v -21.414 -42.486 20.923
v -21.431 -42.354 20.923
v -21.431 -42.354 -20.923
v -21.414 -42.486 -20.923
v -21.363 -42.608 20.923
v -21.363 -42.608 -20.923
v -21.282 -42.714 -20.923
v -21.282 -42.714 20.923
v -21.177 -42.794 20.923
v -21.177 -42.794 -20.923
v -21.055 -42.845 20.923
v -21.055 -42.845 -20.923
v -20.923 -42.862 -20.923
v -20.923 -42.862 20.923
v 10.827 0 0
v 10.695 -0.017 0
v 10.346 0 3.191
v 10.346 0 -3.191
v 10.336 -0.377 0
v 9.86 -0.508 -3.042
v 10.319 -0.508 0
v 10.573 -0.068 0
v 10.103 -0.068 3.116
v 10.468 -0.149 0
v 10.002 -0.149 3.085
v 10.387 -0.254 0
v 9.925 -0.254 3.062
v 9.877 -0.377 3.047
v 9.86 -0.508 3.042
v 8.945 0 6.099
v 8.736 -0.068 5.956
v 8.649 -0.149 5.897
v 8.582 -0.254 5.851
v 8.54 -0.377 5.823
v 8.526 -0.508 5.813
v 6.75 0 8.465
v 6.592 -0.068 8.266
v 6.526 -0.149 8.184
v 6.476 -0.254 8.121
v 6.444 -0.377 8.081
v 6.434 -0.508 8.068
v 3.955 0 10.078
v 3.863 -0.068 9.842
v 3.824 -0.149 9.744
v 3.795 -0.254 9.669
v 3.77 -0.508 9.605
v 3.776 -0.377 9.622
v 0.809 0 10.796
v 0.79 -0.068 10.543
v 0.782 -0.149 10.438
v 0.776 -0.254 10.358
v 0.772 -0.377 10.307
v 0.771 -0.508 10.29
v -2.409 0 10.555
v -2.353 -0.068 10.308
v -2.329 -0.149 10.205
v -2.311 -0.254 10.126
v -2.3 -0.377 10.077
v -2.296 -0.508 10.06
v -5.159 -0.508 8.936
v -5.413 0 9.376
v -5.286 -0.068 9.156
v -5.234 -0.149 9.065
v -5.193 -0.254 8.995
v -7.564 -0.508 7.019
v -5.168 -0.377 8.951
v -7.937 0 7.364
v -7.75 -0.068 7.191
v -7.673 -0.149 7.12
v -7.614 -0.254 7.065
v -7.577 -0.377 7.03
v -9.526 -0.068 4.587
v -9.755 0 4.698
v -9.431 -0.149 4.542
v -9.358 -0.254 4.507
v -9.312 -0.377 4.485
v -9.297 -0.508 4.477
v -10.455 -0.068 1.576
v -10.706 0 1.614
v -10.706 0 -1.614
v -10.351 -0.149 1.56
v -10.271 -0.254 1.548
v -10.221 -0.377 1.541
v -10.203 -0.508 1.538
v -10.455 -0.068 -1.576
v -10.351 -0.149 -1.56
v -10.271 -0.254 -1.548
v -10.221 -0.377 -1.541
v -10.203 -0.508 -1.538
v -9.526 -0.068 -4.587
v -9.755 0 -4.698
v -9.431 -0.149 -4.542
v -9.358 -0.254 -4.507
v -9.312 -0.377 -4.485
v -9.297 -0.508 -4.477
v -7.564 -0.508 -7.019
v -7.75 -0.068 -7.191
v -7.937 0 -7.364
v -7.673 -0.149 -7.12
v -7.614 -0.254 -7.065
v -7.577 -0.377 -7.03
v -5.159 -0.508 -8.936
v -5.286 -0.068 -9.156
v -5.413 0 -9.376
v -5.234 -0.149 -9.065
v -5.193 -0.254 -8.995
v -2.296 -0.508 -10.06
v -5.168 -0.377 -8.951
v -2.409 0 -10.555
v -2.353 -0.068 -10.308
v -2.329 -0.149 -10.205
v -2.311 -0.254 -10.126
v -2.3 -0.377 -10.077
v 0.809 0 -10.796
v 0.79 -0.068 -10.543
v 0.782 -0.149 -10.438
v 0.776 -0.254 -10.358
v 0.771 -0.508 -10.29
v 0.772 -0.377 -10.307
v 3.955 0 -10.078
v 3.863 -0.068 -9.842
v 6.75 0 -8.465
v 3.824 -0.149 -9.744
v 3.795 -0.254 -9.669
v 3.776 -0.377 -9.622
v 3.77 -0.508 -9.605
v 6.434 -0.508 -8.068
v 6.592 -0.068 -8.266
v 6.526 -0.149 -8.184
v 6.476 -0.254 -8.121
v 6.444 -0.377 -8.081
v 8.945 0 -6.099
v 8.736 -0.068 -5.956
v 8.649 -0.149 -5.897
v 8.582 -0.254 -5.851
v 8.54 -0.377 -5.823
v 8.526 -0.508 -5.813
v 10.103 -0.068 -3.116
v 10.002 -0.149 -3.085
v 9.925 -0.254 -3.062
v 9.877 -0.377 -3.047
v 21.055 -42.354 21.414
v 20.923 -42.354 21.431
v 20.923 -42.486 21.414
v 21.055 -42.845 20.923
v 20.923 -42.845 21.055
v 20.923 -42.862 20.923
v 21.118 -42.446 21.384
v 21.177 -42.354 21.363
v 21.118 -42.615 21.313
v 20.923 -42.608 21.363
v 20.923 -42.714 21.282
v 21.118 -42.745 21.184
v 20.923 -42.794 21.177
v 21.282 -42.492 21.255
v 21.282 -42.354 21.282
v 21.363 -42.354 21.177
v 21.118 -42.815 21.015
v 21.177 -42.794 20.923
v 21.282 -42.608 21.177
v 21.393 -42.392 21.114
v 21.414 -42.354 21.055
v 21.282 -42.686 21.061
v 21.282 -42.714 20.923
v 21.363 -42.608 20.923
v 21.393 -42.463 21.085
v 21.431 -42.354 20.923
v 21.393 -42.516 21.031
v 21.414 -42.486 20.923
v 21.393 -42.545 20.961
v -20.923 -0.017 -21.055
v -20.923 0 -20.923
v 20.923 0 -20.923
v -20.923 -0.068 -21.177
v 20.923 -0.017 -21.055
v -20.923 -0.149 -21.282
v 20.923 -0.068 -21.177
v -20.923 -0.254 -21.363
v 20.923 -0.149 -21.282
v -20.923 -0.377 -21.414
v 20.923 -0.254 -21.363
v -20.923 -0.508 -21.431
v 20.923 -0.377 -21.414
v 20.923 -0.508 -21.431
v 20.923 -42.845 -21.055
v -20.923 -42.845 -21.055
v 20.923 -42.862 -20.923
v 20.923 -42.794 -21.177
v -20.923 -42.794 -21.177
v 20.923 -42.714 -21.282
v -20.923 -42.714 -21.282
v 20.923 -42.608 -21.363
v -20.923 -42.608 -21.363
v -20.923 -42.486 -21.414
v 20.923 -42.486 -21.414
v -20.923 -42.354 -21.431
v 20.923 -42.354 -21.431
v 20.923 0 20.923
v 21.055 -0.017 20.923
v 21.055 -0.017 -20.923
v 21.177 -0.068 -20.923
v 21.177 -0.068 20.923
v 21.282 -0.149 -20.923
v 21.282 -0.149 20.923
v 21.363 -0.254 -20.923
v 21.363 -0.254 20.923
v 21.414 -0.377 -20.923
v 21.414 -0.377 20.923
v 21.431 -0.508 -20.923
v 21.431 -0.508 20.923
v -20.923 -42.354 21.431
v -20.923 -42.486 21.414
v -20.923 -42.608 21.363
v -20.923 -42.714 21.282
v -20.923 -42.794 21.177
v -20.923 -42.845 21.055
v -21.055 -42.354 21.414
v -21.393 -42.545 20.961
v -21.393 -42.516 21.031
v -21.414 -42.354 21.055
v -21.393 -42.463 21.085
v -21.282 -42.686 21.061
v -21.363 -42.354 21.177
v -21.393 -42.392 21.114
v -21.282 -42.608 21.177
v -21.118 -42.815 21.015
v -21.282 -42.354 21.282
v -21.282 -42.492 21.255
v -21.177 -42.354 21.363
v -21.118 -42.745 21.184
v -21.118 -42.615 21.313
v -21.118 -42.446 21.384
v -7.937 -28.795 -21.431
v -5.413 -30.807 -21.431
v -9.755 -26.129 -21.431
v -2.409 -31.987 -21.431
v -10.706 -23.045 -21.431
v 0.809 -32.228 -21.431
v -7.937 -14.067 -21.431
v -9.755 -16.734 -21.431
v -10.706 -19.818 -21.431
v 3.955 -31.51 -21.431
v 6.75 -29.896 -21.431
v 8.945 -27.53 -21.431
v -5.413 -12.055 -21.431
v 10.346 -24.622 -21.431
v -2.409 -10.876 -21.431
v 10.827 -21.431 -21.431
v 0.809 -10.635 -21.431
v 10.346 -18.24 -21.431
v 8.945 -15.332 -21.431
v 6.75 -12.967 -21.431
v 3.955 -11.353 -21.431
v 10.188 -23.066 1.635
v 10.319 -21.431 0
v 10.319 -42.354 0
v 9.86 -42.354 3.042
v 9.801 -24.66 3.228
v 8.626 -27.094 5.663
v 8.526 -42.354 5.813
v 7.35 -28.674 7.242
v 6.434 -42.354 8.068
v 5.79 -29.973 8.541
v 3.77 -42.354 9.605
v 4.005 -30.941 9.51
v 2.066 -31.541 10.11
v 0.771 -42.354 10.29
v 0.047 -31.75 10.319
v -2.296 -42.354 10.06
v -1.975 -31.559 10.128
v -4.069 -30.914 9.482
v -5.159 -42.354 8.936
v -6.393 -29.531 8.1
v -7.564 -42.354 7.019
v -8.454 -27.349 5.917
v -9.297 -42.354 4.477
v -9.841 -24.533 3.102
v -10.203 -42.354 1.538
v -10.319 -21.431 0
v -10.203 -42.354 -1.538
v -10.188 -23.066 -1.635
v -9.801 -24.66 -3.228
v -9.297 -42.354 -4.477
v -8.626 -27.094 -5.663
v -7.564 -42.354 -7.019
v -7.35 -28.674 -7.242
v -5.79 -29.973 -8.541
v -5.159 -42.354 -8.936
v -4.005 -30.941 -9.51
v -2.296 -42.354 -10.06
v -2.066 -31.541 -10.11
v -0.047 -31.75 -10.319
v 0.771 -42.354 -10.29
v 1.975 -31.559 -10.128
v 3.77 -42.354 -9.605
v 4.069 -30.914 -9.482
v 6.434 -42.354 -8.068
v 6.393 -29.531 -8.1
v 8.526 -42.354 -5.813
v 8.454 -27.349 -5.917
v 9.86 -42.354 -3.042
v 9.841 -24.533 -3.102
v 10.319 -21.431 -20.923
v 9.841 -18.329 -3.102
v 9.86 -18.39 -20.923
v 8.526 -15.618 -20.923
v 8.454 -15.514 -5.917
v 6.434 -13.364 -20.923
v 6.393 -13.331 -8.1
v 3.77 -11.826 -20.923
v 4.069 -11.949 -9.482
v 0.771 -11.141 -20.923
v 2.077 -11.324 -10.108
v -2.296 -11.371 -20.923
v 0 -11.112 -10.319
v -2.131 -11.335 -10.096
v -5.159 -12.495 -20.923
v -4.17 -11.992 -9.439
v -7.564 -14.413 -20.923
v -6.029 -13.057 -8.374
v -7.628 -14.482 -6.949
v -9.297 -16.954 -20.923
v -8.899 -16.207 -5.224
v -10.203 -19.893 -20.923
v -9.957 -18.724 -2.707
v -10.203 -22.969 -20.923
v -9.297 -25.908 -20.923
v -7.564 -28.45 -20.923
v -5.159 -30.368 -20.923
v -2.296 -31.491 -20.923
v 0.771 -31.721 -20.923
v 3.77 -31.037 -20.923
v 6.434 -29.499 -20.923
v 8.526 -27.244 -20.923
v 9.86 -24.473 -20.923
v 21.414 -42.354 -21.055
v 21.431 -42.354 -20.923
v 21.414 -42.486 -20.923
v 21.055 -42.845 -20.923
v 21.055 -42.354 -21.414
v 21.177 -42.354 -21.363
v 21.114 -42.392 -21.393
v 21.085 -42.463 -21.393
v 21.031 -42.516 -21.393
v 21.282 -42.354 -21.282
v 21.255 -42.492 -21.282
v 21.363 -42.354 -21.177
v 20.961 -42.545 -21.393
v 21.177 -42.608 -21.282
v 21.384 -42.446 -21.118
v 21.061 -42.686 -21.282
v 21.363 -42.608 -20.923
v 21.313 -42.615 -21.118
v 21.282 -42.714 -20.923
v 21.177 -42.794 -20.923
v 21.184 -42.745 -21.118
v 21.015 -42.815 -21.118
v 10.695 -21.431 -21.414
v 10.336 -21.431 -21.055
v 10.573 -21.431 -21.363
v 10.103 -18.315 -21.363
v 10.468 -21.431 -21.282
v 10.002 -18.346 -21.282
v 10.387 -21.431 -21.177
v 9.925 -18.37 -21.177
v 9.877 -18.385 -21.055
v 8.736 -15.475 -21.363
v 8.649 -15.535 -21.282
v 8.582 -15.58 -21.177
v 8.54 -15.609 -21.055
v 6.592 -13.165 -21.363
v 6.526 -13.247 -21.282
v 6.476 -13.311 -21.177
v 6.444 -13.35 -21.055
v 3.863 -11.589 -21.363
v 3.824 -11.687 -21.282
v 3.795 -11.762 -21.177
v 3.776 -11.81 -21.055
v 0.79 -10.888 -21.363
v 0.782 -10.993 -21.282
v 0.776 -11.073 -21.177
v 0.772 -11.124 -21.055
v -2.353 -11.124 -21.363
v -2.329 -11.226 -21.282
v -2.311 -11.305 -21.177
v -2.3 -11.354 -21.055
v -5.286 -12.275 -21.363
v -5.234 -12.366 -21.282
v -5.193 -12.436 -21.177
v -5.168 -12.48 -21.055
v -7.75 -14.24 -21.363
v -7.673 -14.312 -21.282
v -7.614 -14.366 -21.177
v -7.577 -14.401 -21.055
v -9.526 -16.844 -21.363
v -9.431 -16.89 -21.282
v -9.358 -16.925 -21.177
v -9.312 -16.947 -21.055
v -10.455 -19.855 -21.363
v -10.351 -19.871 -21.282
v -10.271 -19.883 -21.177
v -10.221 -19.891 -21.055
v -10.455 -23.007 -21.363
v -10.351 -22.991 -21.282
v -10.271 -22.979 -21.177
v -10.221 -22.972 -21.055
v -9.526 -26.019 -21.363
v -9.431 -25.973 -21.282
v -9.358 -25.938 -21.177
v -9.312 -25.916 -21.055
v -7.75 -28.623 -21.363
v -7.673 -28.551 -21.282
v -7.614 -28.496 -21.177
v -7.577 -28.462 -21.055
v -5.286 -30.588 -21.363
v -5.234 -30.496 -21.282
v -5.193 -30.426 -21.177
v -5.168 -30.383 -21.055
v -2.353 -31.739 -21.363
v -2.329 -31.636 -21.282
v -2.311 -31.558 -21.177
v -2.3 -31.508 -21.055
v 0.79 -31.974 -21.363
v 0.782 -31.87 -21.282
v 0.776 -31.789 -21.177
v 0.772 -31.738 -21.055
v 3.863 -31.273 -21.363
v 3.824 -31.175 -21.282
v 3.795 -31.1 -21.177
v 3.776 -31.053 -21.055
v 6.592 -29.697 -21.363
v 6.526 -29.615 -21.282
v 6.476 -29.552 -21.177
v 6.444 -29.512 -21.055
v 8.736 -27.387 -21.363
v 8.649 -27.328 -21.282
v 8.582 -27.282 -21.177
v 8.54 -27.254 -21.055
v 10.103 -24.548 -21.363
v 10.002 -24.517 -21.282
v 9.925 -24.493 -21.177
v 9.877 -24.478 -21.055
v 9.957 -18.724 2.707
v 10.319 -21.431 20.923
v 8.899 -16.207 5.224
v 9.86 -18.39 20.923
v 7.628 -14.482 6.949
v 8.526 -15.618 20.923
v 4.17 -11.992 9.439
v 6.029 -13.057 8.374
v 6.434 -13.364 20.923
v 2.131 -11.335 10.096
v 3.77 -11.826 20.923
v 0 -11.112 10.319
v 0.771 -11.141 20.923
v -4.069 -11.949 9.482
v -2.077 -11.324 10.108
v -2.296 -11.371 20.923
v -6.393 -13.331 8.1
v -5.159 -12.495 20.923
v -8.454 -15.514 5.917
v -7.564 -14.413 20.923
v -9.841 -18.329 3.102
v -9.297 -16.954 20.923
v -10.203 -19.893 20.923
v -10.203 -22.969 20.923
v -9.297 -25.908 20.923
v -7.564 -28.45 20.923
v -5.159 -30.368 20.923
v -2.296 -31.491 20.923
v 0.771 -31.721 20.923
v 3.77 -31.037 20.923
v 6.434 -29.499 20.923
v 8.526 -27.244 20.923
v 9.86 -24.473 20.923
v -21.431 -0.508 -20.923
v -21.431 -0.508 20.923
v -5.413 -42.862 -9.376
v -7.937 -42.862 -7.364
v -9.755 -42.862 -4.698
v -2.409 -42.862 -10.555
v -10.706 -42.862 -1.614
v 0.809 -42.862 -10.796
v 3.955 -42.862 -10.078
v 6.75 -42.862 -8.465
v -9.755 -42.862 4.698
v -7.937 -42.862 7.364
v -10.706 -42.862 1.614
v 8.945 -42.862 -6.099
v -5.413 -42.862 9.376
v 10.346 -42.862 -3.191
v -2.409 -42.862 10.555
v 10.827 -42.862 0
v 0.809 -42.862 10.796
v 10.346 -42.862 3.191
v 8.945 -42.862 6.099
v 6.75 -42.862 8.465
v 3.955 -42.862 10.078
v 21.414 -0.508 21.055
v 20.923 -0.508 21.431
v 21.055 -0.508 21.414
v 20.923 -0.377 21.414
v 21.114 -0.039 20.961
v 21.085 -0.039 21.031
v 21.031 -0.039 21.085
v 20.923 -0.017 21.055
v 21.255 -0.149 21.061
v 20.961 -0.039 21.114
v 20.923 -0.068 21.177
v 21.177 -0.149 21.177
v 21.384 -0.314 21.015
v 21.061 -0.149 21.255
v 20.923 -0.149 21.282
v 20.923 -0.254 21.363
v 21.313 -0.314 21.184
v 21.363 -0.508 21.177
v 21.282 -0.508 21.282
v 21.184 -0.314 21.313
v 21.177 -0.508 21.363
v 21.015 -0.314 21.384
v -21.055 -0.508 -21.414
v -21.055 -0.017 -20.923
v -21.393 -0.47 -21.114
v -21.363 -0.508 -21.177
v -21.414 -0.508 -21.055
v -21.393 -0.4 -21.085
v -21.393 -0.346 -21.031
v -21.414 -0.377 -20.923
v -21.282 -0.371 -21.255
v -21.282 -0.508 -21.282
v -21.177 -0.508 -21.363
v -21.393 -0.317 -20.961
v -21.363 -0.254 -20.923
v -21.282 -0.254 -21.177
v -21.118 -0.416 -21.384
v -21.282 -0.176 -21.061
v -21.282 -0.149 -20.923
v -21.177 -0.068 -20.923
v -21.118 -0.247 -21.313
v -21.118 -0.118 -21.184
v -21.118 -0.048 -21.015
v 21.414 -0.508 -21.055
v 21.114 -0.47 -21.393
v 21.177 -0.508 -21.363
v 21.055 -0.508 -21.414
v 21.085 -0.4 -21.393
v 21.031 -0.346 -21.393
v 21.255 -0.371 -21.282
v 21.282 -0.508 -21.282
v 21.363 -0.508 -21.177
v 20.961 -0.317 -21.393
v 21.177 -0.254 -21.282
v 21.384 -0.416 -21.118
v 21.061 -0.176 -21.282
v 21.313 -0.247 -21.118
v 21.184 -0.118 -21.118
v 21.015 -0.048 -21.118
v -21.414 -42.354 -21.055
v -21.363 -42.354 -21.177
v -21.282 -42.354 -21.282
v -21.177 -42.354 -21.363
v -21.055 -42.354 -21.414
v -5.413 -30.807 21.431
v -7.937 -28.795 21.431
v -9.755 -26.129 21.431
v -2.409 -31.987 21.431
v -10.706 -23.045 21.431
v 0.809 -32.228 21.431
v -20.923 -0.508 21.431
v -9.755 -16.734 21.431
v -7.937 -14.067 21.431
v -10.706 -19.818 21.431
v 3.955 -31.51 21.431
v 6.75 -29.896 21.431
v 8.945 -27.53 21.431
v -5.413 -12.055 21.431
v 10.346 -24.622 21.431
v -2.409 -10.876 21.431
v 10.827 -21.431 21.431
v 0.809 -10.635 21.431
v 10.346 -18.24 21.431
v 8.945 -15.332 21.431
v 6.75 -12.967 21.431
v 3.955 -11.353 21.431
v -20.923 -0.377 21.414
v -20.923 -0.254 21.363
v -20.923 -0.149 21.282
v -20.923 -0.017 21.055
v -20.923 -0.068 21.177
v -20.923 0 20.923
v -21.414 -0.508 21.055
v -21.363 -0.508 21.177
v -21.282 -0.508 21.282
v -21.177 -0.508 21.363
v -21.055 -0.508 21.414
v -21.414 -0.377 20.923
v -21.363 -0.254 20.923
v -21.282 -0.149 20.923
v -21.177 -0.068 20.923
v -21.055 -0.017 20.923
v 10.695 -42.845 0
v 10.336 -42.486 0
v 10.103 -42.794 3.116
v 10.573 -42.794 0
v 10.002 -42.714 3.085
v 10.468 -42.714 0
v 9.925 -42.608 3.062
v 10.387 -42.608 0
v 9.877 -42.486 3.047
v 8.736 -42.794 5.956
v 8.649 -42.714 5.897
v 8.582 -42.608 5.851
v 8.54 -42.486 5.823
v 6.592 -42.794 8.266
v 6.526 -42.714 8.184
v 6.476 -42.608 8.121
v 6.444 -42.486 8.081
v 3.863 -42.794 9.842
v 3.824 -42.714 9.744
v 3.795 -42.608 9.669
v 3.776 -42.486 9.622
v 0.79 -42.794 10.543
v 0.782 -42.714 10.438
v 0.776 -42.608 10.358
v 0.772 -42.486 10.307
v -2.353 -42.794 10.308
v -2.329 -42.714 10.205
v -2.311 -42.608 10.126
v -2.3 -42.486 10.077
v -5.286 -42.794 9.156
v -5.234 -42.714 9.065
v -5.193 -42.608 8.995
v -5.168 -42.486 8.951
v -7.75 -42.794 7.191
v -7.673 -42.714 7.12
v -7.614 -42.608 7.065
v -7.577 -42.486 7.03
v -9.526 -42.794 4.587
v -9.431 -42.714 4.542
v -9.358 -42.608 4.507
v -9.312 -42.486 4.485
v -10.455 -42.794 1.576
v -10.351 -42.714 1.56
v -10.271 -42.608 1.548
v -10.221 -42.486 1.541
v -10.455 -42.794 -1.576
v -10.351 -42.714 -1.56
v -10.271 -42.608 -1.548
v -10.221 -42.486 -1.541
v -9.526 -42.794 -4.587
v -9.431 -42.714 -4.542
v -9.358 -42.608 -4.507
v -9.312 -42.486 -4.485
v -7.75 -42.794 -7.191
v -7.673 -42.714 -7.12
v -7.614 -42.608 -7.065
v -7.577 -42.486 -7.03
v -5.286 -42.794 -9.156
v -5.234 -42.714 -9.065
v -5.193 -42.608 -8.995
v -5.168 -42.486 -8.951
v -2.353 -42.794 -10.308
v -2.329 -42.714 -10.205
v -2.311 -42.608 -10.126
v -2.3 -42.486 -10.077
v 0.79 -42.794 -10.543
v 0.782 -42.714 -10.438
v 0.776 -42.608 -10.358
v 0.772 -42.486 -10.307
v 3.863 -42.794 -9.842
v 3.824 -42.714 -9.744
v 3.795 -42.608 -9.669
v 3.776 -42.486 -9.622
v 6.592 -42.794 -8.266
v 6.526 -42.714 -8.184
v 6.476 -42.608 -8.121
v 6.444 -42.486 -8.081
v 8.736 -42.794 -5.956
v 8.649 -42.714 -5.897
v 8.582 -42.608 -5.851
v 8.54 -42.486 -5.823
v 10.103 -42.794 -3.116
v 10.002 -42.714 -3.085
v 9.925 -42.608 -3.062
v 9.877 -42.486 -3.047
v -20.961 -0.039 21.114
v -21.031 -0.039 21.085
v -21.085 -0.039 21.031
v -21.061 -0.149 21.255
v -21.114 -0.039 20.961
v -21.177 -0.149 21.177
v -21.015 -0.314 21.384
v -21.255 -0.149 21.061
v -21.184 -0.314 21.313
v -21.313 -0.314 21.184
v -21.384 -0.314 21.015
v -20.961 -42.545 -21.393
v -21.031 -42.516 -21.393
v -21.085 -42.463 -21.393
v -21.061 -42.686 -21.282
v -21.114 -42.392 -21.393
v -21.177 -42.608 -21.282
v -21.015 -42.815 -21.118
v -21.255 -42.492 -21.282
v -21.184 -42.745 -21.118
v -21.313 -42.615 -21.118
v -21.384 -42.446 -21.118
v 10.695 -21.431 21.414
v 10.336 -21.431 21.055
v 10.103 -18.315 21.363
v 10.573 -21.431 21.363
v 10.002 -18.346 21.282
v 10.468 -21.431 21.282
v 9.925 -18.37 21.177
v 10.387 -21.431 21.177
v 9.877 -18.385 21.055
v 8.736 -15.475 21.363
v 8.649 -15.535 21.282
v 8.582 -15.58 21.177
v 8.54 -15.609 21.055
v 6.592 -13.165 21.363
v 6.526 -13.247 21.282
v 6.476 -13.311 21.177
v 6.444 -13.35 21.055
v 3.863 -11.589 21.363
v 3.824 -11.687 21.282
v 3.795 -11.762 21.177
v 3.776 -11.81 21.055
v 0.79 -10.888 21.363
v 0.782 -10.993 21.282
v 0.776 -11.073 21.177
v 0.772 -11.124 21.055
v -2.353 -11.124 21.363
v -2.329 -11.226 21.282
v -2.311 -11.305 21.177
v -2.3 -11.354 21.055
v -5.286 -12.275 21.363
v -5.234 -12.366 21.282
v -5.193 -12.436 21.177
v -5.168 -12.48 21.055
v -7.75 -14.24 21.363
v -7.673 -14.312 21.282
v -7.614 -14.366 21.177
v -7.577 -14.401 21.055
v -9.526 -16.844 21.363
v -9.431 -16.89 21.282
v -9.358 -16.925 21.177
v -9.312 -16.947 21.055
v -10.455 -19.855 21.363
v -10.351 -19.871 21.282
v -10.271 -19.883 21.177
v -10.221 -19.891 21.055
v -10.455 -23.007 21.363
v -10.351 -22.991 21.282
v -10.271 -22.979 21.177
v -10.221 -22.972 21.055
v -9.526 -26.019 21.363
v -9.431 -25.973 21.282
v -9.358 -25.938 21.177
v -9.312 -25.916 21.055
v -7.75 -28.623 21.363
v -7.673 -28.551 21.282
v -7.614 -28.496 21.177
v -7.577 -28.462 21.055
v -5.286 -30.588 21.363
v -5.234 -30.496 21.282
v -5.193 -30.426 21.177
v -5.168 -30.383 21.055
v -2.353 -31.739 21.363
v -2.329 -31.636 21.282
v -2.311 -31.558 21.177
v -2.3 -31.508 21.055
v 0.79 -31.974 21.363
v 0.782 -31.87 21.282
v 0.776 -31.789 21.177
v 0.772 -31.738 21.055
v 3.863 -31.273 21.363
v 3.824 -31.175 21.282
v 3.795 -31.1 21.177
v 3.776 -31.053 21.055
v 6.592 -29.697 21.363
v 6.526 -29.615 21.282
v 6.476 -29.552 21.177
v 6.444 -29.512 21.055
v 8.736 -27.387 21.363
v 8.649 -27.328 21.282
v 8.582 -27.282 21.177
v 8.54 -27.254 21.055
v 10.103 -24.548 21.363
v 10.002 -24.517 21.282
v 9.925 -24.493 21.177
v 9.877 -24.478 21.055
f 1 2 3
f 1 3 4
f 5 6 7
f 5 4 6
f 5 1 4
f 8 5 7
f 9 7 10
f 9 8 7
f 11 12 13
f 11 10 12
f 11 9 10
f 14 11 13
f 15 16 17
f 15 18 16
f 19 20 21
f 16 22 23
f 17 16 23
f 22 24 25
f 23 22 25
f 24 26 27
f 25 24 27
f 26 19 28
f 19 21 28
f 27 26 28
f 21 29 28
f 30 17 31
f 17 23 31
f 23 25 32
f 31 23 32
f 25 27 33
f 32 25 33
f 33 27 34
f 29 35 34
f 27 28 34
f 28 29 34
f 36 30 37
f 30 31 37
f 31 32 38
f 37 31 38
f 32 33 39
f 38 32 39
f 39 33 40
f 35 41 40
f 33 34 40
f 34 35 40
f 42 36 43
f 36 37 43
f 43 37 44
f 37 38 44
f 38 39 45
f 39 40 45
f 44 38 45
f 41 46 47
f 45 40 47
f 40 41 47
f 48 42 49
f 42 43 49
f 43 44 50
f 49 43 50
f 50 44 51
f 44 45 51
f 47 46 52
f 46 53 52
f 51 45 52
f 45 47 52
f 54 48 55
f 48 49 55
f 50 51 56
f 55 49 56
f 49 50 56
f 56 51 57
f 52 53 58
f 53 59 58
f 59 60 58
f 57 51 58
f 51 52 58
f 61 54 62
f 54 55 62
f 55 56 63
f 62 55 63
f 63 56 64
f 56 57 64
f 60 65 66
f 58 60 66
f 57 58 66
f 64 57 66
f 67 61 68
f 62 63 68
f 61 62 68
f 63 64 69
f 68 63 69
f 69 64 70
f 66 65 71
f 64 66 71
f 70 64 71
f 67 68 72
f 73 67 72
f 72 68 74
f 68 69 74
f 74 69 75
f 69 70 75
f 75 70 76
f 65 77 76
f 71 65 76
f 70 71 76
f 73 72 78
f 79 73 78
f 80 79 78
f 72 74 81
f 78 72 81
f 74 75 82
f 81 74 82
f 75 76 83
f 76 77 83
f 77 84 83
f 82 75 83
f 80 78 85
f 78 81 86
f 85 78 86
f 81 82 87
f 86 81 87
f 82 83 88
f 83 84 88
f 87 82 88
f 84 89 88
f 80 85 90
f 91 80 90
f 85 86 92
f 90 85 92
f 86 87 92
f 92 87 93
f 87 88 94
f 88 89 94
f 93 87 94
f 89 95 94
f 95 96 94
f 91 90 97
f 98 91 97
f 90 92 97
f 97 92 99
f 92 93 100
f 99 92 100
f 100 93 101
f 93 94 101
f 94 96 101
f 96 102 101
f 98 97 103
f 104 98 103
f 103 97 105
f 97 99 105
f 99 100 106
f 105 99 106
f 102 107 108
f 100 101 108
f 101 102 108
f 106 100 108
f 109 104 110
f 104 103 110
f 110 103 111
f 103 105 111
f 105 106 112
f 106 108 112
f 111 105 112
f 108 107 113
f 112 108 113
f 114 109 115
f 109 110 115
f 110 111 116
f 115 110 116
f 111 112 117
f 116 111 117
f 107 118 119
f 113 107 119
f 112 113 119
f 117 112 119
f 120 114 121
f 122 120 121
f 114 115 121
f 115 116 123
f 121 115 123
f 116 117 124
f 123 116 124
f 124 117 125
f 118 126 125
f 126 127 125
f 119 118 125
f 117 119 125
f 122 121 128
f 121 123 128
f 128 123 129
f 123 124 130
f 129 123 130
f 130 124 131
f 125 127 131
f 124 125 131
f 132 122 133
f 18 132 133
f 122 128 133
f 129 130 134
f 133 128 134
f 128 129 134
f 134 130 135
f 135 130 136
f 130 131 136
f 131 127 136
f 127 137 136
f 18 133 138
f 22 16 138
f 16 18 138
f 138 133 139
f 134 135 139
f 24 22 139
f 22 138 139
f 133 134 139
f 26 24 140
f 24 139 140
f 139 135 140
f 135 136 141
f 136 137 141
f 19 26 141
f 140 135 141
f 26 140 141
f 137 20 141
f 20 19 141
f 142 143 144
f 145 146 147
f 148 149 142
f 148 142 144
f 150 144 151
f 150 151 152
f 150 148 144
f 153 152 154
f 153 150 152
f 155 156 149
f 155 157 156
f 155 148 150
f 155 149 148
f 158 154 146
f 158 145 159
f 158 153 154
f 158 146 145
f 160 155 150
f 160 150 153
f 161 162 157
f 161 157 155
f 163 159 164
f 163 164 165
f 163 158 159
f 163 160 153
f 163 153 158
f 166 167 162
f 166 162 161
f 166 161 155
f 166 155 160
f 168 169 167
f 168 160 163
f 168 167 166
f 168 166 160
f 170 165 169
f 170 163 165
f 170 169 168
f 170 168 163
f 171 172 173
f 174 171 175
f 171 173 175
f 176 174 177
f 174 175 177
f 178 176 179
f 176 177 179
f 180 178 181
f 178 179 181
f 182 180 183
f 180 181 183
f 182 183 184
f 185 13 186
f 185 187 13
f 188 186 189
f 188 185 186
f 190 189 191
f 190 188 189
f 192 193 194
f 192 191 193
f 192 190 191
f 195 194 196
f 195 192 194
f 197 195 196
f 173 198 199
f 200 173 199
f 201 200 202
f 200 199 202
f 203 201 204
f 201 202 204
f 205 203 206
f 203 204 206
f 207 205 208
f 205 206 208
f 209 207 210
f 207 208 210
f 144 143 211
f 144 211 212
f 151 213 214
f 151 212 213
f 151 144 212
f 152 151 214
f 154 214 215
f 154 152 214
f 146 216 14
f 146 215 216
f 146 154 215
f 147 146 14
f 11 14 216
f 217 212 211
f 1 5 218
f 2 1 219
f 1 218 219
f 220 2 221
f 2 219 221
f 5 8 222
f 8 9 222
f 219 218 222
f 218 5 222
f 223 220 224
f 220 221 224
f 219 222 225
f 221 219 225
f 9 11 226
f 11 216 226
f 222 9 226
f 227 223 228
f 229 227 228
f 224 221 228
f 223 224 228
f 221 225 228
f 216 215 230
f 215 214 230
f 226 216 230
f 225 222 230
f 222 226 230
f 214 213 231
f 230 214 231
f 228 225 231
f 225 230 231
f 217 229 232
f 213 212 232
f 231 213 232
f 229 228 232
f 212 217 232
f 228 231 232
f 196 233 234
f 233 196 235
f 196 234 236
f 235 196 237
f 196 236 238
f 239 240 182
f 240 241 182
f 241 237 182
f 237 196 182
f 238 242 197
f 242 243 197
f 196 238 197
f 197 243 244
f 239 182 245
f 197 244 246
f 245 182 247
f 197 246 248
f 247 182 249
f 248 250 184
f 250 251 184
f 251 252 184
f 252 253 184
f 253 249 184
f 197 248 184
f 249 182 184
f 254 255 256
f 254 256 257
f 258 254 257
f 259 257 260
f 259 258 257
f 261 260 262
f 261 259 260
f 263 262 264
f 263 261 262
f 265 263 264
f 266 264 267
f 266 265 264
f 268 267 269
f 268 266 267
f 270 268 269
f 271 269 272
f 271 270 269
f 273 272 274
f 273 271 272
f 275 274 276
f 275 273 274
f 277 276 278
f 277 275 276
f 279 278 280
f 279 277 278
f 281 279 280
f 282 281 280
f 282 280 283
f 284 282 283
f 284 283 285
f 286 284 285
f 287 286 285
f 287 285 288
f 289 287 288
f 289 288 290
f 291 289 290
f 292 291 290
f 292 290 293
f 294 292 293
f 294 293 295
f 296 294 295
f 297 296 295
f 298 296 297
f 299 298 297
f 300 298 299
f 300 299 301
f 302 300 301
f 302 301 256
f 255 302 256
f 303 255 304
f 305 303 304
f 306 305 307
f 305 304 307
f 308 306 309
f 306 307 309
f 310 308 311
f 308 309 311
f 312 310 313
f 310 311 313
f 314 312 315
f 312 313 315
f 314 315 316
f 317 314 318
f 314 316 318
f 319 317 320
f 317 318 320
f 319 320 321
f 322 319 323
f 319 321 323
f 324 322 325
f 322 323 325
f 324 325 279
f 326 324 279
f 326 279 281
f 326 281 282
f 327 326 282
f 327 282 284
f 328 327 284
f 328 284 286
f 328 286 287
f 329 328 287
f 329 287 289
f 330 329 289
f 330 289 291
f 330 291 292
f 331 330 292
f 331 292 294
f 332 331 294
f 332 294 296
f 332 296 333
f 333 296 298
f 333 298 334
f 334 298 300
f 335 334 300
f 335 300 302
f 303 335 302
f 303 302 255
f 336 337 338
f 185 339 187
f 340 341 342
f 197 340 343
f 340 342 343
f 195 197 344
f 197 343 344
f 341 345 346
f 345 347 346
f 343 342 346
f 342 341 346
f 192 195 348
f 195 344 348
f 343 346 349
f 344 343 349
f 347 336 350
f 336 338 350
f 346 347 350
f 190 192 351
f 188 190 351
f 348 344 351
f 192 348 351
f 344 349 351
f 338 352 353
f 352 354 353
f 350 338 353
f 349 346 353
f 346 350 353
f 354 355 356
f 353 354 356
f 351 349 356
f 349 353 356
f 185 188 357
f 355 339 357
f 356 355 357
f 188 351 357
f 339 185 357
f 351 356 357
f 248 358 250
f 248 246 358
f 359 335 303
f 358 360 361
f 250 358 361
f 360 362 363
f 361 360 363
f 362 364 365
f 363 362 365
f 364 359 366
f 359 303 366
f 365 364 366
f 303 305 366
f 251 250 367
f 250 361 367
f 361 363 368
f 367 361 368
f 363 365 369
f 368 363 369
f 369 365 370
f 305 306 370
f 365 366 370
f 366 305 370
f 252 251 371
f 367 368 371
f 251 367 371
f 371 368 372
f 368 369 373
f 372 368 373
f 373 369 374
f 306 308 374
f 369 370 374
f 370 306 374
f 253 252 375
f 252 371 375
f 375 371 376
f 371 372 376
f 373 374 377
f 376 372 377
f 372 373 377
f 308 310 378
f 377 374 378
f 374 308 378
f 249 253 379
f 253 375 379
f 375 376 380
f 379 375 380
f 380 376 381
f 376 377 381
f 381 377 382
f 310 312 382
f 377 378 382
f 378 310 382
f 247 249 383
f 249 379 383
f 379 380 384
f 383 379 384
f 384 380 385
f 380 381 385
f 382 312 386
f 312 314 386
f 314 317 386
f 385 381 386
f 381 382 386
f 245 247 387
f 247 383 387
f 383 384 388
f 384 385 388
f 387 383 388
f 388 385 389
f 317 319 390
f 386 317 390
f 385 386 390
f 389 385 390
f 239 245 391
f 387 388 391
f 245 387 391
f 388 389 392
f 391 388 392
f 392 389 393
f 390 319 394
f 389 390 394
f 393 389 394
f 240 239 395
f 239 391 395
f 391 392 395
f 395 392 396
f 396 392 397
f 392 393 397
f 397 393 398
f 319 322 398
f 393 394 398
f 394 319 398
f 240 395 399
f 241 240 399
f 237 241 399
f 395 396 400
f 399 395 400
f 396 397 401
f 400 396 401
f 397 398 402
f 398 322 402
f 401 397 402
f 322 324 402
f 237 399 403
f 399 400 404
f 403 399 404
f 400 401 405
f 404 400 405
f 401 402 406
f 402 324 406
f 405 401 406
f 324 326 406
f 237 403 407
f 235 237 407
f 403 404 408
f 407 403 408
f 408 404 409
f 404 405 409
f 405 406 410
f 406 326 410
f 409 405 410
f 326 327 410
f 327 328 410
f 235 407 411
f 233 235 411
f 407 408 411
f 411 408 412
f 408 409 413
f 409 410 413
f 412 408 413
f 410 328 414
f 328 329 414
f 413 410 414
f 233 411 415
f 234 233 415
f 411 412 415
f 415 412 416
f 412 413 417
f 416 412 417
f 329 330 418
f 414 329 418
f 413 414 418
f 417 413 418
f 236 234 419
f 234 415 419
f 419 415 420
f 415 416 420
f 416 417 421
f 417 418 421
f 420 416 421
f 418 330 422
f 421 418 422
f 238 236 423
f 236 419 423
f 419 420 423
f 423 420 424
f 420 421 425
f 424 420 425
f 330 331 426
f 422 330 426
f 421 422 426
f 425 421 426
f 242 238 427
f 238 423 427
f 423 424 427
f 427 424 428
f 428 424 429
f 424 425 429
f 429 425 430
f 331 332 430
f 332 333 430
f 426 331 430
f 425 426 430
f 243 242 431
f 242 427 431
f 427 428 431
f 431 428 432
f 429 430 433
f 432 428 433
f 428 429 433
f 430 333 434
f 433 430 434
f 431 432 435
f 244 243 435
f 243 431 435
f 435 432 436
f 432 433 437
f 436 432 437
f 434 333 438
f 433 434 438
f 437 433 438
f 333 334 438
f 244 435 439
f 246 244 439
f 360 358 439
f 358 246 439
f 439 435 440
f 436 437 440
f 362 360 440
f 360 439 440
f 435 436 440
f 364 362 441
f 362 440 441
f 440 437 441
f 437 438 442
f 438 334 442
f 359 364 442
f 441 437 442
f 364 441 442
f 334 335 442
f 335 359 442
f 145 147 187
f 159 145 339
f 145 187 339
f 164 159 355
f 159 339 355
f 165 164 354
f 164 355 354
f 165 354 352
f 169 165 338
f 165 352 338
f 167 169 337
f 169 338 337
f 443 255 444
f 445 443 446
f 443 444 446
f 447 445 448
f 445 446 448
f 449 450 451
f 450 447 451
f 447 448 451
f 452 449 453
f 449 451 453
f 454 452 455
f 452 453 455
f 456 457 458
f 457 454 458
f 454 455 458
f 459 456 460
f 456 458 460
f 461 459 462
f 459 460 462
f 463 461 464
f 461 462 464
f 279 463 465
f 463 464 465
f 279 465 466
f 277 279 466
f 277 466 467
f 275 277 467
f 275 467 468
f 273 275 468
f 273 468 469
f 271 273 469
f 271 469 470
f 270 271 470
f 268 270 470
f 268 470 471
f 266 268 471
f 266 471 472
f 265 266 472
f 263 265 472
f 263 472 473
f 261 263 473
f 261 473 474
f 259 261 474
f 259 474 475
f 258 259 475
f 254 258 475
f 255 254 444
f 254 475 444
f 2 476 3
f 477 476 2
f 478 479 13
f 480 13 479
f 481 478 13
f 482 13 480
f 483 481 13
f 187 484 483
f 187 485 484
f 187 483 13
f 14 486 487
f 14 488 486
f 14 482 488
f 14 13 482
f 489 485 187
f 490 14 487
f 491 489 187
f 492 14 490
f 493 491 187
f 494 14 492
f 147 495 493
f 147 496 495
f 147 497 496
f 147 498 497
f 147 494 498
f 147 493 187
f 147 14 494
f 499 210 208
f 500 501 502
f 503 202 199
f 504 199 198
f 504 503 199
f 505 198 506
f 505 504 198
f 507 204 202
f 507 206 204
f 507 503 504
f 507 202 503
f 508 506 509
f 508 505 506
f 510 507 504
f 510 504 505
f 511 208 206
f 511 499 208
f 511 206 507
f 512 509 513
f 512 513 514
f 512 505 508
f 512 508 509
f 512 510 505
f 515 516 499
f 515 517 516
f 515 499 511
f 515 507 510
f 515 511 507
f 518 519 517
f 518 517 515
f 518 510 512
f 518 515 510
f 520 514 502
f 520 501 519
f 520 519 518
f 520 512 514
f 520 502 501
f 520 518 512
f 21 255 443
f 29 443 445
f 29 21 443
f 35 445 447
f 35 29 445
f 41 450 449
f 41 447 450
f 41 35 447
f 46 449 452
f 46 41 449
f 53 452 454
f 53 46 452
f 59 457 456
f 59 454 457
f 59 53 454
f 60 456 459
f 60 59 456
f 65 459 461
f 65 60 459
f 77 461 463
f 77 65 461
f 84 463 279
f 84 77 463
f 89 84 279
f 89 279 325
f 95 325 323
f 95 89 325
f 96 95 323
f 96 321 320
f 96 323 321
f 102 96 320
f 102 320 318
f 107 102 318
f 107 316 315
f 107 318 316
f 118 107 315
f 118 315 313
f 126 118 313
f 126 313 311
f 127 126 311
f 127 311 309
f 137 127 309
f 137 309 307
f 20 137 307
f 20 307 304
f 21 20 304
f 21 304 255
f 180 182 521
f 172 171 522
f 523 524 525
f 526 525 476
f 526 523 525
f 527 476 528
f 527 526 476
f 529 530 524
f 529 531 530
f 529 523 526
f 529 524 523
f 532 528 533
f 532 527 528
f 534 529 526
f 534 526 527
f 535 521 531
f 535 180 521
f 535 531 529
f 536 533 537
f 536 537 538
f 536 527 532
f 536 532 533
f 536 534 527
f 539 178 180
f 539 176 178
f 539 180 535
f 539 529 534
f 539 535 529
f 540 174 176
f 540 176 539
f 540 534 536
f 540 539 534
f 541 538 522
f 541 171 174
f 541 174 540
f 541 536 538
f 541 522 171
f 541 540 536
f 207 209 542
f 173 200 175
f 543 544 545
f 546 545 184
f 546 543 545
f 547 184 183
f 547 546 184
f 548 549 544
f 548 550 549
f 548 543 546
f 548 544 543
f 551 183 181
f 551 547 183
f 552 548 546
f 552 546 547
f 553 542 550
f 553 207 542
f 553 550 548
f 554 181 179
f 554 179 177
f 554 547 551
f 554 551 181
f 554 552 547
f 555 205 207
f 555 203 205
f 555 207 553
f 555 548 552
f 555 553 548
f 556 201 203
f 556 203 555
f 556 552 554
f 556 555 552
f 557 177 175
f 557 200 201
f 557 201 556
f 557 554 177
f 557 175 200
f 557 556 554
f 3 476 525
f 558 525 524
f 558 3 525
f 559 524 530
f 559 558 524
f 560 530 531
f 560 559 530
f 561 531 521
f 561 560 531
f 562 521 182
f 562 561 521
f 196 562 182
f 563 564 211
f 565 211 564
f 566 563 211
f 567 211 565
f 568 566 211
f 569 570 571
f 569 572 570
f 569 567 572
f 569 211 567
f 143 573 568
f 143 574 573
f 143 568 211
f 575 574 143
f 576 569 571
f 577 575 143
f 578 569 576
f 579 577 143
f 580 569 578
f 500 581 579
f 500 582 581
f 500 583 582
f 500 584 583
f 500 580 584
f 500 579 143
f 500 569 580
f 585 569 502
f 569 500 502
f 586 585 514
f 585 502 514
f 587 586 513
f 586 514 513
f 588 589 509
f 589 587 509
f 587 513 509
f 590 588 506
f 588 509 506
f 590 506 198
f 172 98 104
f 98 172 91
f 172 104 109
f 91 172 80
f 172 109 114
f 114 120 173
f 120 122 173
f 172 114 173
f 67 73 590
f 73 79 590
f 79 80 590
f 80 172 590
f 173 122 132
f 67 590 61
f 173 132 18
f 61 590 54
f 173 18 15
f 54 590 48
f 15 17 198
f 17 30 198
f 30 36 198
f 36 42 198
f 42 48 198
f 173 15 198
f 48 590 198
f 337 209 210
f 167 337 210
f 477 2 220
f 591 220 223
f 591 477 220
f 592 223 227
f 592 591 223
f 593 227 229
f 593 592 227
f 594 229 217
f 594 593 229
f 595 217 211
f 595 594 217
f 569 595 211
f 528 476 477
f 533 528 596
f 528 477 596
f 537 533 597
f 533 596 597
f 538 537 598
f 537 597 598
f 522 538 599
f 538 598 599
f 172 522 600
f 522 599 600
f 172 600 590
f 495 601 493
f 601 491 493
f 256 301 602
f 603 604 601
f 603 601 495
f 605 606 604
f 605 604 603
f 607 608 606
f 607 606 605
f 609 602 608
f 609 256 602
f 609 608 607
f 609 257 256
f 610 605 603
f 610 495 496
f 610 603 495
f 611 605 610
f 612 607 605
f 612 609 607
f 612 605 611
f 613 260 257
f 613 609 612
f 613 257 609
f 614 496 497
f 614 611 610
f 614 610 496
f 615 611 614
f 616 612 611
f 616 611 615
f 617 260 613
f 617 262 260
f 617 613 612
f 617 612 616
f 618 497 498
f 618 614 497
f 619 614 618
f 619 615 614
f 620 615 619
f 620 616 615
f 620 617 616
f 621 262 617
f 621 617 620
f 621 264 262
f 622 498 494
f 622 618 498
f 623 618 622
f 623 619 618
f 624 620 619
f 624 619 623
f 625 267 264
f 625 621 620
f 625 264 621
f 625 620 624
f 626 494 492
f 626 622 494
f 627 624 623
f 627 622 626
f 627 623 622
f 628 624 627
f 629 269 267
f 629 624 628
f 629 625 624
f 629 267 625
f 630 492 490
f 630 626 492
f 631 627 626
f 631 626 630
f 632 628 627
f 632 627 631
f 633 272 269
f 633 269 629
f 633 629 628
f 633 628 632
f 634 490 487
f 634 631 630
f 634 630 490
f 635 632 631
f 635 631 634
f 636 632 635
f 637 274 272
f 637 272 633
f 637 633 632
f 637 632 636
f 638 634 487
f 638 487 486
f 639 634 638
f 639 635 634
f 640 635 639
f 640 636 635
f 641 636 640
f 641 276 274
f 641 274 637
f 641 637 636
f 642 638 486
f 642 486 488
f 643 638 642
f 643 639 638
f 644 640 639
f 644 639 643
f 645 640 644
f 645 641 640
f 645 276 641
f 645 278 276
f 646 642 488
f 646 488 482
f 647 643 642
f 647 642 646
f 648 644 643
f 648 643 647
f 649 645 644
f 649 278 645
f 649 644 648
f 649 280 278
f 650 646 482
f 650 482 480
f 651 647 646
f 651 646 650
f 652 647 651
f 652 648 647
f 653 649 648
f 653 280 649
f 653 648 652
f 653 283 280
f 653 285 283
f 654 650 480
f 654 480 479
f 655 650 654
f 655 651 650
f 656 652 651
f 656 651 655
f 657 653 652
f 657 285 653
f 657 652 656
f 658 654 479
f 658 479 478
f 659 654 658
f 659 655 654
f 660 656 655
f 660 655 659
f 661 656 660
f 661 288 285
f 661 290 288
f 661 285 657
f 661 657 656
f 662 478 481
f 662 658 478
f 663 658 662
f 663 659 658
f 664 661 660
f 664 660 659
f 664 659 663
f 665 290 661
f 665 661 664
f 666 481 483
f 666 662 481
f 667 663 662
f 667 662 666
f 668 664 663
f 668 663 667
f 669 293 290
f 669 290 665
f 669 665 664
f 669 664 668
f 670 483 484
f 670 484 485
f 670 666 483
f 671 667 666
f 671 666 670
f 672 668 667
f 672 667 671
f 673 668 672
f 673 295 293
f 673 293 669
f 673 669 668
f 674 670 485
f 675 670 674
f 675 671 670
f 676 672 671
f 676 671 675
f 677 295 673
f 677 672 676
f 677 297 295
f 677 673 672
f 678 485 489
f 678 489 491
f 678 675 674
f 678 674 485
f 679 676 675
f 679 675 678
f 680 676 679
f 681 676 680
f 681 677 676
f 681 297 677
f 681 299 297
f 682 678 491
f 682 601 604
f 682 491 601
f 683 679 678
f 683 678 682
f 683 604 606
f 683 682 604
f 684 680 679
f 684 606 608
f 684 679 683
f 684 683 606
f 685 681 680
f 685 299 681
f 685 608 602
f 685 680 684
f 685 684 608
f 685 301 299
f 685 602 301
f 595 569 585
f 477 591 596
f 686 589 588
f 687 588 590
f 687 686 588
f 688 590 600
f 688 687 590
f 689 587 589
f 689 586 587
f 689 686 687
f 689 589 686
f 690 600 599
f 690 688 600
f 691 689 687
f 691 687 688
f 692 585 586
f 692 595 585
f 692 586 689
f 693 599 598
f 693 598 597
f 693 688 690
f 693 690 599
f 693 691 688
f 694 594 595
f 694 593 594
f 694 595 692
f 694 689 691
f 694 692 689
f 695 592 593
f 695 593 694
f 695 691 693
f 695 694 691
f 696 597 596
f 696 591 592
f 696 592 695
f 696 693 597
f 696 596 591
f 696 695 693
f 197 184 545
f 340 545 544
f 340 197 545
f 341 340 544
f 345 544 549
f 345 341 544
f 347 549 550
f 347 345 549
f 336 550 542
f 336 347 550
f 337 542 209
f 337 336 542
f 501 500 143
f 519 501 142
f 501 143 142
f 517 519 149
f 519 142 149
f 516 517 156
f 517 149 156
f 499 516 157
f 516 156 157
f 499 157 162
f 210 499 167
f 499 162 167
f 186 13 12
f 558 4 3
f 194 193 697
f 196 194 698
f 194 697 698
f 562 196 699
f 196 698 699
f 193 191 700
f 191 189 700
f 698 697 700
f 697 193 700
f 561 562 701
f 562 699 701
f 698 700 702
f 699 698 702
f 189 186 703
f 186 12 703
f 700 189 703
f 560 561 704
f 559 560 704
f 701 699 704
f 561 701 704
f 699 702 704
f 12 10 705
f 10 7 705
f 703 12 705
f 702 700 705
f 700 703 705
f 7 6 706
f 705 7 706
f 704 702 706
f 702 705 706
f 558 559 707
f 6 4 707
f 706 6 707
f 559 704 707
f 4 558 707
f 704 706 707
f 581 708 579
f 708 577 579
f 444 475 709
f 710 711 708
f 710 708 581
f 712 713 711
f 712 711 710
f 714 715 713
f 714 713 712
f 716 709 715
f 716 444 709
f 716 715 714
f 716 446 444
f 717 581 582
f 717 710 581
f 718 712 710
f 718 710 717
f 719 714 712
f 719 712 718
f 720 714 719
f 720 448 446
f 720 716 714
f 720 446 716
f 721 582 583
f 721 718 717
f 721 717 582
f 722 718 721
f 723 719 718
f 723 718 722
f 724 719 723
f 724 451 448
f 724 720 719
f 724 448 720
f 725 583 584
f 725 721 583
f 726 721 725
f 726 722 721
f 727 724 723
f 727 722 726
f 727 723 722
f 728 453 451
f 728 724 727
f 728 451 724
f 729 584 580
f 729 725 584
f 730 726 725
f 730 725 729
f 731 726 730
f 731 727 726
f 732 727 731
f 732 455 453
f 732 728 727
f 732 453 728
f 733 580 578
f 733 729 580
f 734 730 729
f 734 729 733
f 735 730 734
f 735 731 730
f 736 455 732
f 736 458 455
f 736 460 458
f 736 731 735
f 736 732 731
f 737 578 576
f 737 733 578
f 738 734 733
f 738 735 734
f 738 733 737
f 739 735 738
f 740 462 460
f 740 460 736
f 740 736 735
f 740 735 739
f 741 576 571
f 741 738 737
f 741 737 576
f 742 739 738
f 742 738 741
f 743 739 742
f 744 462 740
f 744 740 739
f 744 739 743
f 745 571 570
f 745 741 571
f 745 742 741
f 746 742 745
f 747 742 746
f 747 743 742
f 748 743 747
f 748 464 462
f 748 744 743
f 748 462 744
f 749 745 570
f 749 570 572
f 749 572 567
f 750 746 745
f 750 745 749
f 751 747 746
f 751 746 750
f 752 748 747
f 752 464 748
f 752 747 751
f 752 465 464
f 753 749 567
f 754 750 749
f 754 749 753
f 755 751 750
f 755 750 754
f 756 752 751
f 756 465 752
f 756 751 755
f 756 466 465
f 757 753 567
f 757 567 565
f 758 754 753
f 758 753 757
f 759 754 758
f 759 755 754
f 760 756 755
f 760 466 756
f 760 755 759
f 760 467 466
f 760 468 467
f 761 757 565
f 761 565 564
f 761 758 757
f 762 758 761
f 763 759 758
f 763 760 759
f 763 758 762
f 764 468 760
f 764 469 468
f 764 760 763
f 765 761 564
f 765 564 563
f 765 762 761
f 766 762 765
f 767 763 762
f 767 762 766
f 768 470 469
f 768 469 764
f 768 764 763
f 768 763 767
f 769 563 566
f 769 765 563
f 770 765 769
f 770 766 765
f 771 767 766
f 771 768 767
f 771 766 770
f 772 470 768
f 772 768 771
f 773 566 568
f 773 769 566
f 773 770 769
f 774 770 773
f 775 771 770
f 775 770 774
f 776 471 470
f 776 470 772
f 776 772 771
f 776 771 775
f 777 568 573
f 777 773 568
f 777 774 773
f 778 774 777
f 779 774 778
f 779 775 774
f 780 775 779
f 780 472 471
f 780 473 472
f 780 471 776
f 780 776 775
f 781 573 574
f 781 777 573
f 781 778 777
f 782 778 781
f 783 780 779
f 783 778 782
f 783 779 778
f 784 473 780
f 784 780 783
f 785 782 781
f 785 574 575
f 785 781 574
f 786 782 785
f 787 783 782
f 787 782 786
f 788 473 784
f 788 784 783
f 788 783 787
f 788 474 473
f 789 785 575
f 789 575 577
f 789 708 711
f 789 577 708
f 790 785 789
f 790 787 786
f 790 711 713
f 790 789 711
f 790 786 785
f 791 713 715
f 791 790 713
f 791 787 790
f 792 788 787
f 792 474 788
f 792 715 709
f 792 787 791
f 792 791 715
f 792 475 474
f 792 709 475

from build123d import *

# Parameters (mm, degrees)
F0_W     = 42.8625
F0_H     = 42.8625
F0_R     = 10.31875
F1_DEPTH = 42.8625
F2_R     = 10.31875
F3_DEPTH = 42.8635
F4_R     = 0.508
F5_R     = 0.508
F6_R     = 0.508


with BuildPart() as f1:
    # F0 (on Front) → F1 (new body)
    with BuildSketch(Plane.XZ):
        Rectangle(F0_W, F0_H)
        Circle(F0_R, mode=Mode.SUBTRACT)
    extrude(amount=F1_DEPTH)

    # F2 (on face) → F3 (cut, through all)
    with BuildSketch(Plane.XY.offset(21.43125)):
        with Locations((0, -21.43125)):
            Circle(F2_R)
    extrude(amount=-F3_DEPTH, mode=Mode.SUBTRACT)

    # F4
    f4_edges = [f1.edges().sort_by_distance(p)[0] for p in [
        (0, -42.8625, 21.43125),
    ]]
    fillet(f4_edges, radius=F4_R)

    # F5
    f5_edges = [f1.edges().sort_by_distance(p)[0] for p in [
        (21.43125, -21.17725, 21.43125),
        (21.43125, 0, 0),
        (21.43125, -21.43125, -21.43125),
        (-21.43125, -42.8625, -0.254),
        (0, -42.8625, -21.43125),
        (0, 0, -21.43125),
        (-21.43125, -21.43125, -21.43125),
        (0, 0, 21.43125),
        (21.43125, -42.8625, -0.254),
        (0, -42.8625, 20.92325),
        (-21.43125, 0, 0),
        (-21.43125, -21.17725, 21.43125),
    ]]
    fillet(f5_edges, radius=F5_R)

    # F6
    f6_edges = [f1.edges().sort_by_distance(p)[0] for p in [
        (-10.31875, -42.8625, 0),
        (-10.31875, -21.43125, -21.43125),
        (-10.31875, -21.43125, 21.43125),
        (-10.31875, 0, 0),
    ]]
    fillet(f6_edges, radius=F6_R)


solid = f1.part
